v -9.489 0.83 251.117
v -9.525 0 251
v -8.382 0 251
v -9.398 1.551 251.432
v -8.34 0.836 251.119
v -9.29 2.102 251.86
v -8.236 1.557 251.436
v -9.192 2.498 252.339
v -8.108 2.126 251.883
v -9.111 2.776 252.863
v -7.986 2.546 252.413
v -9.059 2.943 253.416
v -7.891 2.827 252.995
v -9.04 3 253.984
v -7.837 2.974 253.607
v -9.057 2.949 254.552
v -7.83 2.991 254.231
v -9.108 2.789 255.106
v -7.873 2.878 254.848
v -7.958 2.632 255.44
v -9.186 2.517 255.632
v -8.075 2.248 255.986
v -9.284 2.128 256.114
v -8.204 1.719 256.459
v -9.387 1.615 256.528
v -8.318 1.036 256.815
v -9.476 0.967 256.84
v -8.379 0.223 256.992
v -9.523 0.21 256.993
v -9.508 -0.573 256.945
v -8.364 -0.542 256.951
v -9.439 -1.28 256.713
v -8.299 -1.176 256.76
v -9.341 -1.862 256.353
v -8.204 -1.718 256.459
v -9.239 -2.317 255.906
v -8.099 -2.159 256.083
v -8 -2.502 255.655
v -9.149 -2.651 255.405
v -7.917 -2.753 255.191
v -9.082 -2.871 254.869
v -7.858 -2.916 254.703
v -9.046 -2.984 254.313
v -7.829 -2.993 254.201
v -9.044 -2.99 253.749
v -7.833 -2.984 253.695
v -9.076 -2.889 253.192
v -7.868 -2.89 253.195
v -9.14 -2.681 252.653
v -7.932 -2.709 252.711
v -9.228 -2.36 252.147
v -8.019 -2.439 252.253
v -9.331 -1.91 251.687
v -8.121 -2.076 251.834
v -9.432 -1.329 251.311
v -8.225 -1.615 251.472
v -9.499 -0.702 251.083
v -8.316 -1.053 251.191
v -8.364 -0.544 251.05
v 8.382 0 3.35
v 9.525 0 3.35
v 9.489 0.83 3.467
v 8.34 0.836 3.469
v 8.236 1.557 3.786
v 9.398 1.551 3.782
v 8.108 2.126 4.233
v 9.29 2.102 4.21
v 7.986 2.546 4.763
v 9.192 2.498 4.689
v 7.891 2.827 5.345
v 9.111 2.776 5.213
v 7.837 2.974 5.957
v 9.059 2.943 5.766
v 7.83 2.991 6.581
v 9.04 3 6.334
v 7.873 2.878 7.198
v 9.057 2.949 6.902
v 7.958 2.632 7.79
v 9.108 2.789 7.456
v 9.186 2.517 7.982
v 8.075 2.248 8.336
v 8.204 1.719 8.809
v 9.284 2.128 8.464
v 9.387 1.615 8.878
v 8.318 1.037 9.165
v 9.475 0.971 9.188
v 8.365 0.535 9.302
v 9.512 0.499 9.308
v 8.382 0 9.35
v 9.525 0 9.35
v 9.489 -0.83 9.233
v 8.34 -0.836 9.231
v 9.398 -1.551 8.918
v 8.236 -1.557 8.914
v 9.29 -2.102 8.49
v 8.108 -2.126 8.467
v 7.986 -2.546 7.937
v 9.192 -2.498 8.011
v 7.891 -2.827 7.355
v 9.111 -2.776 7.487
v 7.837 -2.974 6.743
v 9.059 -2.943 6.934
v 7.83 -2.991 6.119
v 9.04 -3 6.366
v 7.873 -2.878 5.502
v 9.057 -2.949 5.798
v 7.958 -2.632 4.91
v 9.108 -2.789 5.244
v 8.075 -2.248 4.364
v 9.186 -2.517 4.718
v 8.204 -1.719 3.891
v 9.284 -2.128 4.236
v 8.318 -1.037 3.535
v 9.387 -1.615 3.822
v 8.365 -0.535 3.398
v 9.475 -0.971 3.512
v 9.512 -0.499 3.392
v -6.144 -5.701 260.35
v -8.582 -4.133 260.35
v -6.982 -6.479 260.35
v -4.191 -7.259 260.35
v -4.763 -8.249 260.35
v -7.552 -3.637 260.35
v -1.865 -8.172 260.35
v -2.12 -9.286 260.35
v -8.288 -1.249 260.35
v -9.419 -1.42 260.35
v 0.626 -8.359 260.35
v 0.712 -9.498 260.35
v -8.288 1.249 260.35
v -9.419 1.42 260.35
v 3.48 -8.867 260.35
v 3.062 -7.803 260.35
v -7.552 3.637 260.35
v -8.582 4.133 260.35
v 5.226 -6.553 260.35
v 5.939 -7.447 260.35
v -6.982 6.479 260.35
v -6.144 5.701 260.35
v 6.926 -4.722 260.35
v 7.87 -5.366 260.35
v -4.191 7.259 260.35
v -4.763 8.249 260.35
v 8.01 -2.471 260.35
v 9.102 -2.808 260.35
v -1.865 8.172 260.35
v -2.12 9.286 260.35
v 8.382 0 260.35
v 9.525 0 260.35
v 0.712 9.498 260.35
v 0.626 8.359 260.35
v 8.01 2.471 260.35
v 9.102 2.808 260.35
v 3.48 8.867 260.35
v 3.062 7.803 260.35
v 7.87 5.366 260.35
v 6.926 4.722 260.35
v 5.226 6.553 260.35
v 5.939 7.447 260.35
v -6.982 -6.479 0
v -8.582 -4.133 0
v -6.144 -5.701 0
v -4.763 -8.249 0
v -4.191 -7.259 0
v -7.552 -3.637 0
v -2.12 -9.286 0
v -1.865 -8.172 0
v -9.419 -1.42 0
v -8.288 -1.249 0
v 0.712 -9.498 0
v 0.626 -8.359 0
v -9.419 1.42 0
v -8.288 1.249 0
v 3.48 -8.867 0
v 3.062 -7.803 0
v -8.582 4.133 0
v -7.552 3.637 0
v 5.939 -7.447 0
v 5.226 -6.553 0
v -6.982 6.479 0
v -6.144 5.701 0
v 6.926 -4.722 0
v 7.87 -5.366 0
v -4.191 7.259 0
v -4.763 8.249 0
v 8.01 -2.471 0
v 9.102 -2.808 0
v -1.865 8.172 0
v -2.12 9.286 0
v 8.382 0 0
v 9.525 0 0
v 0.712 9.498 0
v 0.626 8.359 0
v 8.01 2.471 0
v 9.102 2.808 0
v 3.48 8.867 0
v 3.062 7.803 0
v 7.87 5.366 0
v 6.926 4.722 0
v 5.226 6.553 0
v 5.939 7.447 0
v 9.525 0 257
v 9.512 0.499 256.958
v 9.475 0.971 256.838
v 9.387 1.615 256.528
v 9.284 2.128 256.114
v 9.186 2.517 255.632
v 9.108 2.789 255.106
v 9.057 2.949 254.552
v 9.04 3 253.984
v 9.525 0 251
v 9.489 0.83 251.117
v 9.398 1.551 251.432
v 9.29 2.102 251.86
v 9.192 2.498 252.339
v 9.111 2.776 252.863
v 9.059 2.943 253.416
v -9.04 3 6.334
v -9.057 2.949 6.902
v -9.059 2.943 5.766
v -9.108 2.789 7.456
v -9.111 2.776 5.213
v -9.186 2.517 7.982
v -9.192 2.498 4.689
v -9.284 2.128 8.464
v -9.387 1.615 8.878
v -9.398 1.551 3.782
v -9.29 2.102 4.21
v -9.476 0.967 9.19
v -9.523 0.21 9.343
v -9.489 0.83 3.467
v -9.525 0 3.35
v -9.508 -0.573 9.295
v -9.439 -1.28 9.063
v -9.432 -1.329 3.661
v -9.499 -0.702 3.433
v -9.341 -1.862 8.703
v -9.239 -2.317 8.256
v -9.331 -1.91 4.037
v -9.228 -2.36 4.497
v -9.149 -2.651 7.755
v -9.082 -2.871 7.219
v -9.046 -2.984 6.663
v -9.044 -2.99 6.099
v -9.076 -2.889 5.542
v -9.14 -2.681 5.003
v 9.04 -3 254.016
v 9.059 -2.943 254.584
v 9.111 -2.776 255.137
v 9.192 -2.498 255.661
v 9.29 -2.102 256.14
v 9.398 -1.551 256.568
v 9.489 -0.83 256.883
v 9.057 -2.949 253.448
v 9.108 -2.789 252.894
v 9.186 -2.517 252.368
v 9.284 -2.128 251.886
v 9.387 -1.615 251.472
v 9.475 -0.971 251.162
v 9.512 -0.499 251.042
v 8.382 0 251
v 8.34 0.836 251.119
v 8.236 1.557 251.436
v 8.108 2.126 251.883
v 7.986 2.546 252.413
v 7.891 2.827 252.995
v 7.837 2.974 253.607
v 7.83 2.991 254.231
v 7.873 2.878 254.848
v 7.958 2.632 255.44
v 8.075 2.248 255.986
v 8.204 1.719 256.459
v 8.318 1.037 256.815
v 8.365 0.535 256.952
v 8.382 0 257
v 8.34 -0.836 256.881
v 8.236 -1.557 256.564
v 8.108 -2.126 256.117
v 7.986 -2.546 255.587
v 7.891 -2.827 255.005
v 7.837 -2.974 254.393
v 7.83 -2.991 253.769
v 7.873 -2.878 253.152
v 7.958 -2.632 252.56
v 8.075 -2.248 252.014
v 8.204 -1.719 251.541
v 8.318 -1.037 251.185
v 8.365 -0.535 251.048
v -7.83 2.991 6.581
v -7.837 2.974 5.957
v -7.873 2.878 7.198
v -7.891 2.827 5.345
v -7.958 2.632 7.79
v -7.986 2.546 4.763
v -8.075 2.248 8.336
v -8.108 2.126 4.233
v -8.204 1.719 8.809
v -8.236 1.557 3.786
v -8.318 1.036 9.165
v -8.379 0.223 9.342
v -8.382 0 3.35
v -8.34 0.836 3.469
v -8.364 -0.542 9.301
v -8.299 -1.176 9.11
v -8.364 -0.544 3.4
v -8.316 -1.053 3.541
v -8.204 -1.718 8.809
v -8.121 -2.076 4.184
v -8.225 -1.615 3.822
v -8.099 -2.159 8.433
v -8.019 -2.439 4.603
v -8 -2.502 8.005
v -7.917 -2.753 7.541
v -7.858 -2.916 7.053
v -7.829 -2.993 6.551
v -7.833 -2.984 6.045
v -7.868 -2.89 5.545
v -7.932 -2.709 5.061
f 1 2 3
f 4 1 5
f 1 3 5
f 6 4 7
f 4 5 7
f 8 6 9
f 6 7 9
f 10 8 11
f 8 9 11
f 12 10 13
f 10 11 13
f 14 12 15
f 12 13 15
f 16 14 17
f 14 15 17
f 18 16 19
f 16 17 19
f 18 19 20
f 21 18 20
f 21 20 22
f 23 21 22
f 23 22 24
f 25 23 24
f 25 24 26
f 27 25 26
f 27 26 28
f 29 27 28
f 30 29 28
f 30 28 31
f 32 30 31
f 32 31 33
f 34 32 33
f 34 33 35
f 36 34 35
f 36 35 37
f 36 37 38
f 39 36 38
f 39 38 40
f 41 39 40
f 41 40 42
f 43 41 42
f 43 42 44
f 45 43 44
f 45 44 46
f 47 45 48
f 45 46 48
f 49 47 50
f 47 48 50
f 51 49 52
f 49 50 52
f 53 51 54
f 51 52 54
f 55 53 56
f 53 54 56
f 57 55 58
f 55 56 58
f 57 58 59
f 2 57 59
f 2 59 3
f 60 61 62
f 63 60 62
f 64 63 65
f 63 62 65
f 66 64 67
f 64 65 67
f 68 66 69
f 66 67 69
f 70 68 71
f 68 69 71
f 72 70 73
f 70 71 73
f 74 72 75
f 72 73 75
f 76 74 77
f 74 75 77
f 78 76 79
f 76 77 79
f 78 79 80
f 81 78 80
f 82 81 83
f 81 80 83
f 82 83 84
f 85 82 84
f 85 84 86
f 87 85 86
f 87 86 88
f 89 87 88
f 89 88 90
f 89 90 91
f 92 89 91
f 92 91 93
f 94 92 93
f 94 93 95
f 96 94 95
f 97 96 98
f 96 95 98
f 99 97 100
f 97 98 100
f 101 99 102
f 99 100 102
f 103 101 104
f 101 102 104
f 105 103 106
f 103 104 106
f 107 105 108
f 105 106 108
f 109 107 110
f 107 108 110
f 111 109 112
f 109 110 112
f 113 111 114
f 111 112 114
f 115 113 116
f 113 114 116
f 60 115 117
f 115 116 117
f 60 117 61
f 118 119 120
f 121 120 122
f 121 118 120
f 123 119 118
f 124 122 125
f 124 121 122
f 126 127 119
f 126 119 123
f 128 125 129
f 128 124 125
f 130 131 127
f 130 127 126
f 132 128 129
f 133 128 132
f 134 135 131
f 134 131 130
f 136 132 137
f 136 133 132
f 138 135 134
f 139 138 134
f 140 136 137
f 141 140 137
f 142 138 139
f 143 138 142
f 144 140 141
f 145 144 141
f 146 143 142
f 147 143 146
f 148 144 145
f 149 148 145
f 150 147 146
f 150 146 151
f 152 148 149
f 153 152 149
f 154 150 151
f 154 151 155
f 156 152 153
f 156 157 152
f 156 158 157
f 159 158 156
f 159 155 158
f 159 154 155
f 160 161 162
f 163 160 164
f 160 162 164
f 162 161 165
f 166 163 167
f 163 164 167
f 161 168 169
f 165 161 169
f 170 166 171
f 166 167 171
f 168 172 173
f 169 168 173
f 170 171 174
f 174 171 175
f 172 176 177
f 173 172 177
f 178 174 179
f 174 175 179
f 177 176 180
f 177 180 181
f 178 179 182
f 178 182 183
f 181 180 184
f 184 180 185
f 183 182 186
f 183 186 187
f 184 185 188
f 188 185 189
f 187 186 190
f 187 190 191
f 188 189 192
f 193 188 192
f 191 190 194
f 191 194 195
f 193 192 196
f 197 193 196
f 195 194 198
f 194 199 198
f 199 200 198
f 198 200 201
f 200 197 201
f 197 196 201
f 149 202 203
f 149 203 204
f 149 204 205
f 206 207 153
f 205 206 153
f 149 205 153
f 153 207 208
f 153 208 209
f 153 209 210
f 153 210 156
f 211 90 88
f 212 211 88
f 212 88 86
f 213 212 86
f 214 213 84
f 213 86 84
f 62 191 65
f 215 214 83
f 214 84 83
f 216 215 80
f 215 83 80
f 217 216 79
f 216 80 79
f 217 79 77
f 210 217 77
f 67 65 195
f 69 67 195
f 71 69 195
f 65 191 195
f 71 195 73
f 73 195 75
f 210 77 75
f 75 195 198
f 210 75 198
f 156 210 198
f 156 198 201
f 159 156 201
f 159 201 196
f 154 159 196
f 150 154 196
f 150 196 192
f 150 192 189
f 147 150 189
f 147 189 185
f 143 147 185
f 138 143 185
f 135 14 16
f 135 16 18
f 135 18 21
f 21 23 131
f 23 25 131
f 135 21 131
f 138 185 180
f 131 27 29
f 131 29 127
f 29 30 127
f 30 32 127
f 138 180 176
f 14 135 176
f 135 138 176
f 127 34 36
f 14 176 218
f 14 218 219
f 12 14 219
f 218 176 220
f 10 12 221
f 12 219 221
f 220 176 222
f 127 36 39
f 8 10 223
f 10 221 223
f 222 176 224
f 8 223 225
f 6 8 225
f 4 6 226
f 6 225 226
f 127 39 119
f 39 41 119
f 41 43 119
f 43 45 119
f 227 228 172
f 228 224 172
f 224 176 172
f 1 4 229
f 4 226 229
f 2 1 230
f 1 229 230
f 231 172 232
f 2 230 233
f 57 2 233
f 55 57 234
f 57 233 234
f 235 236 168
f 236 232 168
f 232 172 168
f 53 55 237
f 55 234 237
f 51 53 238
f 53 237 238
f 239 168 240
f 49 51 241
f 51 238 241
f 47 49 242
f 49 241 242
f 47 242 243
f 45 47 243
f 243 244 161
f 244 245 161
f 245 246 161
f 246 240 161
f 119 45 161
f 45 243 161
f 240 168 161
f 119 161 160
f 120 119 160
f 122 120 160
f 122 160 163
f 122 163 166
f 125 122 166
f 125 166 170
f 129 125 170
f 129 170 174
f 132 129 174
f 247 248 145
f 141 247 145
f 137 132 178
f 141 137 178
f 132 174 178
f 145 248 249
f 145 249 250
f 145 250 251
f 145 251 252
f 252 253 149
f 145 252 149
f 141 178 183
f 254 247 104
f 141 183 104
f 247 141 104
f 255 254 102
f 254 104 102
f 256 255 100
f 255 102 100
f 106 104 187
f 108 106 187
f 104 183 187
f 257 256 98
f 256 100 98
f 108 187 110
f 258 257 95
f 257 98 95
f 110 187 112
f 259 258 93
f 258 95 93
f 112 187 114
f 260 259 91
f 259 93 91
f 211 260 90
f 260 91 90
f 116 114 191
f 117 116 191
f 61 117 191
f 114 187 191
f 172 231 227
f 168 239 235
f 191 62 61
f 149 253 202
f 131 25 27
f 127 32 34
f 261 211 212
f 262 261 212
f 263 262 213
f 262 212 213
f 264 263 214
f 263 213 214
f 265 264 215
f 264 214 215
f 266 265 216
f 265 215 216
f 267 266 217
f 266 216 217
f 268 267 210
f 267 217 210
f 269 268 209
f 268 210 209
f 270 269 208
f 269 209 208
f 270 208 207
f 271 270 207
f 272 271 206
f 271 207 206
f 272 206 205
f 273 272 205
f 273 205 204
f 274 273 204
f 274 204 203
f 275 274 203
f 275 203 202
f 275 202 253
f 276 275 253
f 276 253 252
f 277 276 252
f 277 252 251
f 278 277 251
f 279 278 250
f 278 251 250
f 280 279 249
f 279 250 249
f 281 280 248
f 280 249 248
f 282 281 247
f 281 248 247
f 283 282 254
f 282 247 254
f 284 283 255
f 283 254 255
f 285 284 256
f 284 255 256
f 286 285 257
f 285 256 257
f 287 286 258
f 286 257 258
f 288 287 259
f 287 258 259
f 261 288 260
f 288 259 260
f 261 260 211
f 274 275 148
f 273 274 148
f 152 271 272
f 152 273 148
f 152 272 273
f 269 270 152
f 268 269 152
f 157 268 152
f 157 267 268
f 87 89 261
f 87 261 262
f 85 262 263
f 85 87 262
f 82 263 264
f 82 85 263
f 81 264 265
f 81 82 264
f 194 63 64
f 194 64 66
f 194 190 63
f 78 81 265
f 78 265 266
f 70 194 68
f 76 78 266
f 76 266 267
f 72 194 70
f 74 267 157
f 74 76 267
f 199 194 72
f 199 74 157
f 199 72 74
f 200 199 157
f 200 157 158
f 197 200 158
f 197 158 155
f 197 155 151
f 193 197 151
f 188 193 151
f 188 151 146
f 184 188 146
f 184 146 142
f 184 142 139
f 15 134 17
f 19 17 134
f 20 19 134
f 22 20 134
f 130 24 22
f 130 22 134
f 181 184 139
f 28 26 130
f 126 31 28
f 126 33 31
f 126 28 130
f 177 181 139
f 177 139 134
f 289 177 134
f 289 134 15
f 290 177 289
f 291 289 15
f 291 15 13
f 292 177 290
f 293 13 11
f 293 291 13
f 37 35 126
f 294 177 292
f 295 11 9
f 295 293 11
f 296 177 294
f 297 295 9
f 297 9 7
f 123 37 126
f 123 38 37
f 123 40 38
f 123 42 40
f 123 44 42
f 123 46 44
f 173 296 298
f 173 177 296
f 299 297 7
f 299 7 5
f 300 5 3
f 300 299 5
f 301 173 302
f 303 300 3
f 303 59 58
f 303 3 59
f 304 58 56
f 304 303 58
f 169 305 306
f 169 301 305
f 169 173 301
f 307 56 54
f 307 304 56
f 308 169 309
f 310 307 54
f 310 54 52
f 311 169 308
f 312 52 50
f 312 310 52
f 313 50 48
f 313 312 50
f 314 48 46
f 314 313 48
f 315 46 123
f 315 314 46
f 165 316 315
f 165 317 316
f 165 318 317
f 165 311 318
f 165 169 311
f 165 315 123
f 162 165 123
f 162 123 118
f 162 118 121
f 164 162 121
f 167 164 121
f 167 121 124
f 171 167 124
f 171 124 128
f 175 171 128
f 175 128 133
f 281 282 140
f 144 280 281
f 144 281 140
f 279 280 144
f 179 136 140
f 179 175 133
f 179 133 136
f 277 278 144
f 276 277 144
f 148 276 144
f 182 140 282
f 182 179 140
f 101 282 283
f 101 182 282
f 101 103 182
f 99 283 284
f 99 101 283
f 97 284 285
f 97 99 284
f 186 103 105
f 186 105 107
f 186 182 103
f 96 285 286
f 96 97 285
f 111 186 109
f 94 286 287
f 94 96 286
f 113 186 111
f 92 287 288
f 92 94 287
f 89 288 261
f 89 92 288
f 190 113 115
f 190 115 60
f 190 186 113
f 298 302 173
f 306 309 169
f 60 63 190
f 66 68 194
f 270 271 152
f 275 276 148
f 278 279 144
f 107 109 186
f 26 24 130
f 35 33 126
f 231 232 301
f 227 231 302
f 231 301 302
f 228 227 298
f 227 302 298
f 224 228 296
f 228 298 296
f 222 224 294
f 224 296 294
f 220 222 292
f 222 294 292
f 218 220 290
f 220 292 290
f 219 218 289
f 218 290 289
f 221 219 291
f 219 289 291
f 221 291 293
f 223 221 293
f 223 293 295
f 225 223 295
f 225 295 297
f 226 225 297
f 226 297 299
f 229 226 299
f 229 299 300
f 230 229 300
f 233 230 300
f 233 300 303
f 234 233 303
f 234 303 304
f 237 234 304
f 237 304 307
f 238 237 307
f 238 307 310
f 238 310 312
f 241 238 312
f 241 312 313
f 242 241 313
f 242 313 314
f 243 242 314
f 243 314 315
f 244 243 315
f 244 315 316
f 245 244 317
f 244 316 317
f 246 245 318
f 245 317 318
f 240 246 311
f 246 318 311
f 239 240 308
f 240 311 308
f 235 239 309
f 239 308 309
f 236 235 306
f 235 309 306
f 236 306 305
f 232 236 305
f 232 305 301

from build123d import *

# Parameters (mm, degrees)
SKETCH1_R           = 9.525
SKETCH1_R_2         = 8.382
BOSS_EXTRUDE1_DEPTH = 260.35
SKETCH2_R           = 3
CUT_EXTRUDE1_DEPTH  = 20.05


with BuildPart() as part:
    # Sketch1 → Boss-Extrude1 (new body)
    with BuildSketch(Plane.XY):
        Circle(SKETCH1_R)
        Circle(SKETCH1_R_2, mode=Mode.SUBTRACT)
    extrude(amount=BOSS_EXTRUDE1_DEPTH)

    # Sketch2 → Cut-Extrude1 (cut, through all)
    with BuildSketch(Plane(origin=(9.525, 0, 0), x_dir=(0, 0, -1), z_dir=(1, 0, 0))):
        with Locations((-254, 0)):
            Circle(SKETCH2_R)
        with Locations((-6.35, 0)):
            Circle(SKETCH2_R)
    extrude(amount=-CUT_EXTRUDE1_DEPTH, mode=Mode.SUBTRACT)


solid = part.part
